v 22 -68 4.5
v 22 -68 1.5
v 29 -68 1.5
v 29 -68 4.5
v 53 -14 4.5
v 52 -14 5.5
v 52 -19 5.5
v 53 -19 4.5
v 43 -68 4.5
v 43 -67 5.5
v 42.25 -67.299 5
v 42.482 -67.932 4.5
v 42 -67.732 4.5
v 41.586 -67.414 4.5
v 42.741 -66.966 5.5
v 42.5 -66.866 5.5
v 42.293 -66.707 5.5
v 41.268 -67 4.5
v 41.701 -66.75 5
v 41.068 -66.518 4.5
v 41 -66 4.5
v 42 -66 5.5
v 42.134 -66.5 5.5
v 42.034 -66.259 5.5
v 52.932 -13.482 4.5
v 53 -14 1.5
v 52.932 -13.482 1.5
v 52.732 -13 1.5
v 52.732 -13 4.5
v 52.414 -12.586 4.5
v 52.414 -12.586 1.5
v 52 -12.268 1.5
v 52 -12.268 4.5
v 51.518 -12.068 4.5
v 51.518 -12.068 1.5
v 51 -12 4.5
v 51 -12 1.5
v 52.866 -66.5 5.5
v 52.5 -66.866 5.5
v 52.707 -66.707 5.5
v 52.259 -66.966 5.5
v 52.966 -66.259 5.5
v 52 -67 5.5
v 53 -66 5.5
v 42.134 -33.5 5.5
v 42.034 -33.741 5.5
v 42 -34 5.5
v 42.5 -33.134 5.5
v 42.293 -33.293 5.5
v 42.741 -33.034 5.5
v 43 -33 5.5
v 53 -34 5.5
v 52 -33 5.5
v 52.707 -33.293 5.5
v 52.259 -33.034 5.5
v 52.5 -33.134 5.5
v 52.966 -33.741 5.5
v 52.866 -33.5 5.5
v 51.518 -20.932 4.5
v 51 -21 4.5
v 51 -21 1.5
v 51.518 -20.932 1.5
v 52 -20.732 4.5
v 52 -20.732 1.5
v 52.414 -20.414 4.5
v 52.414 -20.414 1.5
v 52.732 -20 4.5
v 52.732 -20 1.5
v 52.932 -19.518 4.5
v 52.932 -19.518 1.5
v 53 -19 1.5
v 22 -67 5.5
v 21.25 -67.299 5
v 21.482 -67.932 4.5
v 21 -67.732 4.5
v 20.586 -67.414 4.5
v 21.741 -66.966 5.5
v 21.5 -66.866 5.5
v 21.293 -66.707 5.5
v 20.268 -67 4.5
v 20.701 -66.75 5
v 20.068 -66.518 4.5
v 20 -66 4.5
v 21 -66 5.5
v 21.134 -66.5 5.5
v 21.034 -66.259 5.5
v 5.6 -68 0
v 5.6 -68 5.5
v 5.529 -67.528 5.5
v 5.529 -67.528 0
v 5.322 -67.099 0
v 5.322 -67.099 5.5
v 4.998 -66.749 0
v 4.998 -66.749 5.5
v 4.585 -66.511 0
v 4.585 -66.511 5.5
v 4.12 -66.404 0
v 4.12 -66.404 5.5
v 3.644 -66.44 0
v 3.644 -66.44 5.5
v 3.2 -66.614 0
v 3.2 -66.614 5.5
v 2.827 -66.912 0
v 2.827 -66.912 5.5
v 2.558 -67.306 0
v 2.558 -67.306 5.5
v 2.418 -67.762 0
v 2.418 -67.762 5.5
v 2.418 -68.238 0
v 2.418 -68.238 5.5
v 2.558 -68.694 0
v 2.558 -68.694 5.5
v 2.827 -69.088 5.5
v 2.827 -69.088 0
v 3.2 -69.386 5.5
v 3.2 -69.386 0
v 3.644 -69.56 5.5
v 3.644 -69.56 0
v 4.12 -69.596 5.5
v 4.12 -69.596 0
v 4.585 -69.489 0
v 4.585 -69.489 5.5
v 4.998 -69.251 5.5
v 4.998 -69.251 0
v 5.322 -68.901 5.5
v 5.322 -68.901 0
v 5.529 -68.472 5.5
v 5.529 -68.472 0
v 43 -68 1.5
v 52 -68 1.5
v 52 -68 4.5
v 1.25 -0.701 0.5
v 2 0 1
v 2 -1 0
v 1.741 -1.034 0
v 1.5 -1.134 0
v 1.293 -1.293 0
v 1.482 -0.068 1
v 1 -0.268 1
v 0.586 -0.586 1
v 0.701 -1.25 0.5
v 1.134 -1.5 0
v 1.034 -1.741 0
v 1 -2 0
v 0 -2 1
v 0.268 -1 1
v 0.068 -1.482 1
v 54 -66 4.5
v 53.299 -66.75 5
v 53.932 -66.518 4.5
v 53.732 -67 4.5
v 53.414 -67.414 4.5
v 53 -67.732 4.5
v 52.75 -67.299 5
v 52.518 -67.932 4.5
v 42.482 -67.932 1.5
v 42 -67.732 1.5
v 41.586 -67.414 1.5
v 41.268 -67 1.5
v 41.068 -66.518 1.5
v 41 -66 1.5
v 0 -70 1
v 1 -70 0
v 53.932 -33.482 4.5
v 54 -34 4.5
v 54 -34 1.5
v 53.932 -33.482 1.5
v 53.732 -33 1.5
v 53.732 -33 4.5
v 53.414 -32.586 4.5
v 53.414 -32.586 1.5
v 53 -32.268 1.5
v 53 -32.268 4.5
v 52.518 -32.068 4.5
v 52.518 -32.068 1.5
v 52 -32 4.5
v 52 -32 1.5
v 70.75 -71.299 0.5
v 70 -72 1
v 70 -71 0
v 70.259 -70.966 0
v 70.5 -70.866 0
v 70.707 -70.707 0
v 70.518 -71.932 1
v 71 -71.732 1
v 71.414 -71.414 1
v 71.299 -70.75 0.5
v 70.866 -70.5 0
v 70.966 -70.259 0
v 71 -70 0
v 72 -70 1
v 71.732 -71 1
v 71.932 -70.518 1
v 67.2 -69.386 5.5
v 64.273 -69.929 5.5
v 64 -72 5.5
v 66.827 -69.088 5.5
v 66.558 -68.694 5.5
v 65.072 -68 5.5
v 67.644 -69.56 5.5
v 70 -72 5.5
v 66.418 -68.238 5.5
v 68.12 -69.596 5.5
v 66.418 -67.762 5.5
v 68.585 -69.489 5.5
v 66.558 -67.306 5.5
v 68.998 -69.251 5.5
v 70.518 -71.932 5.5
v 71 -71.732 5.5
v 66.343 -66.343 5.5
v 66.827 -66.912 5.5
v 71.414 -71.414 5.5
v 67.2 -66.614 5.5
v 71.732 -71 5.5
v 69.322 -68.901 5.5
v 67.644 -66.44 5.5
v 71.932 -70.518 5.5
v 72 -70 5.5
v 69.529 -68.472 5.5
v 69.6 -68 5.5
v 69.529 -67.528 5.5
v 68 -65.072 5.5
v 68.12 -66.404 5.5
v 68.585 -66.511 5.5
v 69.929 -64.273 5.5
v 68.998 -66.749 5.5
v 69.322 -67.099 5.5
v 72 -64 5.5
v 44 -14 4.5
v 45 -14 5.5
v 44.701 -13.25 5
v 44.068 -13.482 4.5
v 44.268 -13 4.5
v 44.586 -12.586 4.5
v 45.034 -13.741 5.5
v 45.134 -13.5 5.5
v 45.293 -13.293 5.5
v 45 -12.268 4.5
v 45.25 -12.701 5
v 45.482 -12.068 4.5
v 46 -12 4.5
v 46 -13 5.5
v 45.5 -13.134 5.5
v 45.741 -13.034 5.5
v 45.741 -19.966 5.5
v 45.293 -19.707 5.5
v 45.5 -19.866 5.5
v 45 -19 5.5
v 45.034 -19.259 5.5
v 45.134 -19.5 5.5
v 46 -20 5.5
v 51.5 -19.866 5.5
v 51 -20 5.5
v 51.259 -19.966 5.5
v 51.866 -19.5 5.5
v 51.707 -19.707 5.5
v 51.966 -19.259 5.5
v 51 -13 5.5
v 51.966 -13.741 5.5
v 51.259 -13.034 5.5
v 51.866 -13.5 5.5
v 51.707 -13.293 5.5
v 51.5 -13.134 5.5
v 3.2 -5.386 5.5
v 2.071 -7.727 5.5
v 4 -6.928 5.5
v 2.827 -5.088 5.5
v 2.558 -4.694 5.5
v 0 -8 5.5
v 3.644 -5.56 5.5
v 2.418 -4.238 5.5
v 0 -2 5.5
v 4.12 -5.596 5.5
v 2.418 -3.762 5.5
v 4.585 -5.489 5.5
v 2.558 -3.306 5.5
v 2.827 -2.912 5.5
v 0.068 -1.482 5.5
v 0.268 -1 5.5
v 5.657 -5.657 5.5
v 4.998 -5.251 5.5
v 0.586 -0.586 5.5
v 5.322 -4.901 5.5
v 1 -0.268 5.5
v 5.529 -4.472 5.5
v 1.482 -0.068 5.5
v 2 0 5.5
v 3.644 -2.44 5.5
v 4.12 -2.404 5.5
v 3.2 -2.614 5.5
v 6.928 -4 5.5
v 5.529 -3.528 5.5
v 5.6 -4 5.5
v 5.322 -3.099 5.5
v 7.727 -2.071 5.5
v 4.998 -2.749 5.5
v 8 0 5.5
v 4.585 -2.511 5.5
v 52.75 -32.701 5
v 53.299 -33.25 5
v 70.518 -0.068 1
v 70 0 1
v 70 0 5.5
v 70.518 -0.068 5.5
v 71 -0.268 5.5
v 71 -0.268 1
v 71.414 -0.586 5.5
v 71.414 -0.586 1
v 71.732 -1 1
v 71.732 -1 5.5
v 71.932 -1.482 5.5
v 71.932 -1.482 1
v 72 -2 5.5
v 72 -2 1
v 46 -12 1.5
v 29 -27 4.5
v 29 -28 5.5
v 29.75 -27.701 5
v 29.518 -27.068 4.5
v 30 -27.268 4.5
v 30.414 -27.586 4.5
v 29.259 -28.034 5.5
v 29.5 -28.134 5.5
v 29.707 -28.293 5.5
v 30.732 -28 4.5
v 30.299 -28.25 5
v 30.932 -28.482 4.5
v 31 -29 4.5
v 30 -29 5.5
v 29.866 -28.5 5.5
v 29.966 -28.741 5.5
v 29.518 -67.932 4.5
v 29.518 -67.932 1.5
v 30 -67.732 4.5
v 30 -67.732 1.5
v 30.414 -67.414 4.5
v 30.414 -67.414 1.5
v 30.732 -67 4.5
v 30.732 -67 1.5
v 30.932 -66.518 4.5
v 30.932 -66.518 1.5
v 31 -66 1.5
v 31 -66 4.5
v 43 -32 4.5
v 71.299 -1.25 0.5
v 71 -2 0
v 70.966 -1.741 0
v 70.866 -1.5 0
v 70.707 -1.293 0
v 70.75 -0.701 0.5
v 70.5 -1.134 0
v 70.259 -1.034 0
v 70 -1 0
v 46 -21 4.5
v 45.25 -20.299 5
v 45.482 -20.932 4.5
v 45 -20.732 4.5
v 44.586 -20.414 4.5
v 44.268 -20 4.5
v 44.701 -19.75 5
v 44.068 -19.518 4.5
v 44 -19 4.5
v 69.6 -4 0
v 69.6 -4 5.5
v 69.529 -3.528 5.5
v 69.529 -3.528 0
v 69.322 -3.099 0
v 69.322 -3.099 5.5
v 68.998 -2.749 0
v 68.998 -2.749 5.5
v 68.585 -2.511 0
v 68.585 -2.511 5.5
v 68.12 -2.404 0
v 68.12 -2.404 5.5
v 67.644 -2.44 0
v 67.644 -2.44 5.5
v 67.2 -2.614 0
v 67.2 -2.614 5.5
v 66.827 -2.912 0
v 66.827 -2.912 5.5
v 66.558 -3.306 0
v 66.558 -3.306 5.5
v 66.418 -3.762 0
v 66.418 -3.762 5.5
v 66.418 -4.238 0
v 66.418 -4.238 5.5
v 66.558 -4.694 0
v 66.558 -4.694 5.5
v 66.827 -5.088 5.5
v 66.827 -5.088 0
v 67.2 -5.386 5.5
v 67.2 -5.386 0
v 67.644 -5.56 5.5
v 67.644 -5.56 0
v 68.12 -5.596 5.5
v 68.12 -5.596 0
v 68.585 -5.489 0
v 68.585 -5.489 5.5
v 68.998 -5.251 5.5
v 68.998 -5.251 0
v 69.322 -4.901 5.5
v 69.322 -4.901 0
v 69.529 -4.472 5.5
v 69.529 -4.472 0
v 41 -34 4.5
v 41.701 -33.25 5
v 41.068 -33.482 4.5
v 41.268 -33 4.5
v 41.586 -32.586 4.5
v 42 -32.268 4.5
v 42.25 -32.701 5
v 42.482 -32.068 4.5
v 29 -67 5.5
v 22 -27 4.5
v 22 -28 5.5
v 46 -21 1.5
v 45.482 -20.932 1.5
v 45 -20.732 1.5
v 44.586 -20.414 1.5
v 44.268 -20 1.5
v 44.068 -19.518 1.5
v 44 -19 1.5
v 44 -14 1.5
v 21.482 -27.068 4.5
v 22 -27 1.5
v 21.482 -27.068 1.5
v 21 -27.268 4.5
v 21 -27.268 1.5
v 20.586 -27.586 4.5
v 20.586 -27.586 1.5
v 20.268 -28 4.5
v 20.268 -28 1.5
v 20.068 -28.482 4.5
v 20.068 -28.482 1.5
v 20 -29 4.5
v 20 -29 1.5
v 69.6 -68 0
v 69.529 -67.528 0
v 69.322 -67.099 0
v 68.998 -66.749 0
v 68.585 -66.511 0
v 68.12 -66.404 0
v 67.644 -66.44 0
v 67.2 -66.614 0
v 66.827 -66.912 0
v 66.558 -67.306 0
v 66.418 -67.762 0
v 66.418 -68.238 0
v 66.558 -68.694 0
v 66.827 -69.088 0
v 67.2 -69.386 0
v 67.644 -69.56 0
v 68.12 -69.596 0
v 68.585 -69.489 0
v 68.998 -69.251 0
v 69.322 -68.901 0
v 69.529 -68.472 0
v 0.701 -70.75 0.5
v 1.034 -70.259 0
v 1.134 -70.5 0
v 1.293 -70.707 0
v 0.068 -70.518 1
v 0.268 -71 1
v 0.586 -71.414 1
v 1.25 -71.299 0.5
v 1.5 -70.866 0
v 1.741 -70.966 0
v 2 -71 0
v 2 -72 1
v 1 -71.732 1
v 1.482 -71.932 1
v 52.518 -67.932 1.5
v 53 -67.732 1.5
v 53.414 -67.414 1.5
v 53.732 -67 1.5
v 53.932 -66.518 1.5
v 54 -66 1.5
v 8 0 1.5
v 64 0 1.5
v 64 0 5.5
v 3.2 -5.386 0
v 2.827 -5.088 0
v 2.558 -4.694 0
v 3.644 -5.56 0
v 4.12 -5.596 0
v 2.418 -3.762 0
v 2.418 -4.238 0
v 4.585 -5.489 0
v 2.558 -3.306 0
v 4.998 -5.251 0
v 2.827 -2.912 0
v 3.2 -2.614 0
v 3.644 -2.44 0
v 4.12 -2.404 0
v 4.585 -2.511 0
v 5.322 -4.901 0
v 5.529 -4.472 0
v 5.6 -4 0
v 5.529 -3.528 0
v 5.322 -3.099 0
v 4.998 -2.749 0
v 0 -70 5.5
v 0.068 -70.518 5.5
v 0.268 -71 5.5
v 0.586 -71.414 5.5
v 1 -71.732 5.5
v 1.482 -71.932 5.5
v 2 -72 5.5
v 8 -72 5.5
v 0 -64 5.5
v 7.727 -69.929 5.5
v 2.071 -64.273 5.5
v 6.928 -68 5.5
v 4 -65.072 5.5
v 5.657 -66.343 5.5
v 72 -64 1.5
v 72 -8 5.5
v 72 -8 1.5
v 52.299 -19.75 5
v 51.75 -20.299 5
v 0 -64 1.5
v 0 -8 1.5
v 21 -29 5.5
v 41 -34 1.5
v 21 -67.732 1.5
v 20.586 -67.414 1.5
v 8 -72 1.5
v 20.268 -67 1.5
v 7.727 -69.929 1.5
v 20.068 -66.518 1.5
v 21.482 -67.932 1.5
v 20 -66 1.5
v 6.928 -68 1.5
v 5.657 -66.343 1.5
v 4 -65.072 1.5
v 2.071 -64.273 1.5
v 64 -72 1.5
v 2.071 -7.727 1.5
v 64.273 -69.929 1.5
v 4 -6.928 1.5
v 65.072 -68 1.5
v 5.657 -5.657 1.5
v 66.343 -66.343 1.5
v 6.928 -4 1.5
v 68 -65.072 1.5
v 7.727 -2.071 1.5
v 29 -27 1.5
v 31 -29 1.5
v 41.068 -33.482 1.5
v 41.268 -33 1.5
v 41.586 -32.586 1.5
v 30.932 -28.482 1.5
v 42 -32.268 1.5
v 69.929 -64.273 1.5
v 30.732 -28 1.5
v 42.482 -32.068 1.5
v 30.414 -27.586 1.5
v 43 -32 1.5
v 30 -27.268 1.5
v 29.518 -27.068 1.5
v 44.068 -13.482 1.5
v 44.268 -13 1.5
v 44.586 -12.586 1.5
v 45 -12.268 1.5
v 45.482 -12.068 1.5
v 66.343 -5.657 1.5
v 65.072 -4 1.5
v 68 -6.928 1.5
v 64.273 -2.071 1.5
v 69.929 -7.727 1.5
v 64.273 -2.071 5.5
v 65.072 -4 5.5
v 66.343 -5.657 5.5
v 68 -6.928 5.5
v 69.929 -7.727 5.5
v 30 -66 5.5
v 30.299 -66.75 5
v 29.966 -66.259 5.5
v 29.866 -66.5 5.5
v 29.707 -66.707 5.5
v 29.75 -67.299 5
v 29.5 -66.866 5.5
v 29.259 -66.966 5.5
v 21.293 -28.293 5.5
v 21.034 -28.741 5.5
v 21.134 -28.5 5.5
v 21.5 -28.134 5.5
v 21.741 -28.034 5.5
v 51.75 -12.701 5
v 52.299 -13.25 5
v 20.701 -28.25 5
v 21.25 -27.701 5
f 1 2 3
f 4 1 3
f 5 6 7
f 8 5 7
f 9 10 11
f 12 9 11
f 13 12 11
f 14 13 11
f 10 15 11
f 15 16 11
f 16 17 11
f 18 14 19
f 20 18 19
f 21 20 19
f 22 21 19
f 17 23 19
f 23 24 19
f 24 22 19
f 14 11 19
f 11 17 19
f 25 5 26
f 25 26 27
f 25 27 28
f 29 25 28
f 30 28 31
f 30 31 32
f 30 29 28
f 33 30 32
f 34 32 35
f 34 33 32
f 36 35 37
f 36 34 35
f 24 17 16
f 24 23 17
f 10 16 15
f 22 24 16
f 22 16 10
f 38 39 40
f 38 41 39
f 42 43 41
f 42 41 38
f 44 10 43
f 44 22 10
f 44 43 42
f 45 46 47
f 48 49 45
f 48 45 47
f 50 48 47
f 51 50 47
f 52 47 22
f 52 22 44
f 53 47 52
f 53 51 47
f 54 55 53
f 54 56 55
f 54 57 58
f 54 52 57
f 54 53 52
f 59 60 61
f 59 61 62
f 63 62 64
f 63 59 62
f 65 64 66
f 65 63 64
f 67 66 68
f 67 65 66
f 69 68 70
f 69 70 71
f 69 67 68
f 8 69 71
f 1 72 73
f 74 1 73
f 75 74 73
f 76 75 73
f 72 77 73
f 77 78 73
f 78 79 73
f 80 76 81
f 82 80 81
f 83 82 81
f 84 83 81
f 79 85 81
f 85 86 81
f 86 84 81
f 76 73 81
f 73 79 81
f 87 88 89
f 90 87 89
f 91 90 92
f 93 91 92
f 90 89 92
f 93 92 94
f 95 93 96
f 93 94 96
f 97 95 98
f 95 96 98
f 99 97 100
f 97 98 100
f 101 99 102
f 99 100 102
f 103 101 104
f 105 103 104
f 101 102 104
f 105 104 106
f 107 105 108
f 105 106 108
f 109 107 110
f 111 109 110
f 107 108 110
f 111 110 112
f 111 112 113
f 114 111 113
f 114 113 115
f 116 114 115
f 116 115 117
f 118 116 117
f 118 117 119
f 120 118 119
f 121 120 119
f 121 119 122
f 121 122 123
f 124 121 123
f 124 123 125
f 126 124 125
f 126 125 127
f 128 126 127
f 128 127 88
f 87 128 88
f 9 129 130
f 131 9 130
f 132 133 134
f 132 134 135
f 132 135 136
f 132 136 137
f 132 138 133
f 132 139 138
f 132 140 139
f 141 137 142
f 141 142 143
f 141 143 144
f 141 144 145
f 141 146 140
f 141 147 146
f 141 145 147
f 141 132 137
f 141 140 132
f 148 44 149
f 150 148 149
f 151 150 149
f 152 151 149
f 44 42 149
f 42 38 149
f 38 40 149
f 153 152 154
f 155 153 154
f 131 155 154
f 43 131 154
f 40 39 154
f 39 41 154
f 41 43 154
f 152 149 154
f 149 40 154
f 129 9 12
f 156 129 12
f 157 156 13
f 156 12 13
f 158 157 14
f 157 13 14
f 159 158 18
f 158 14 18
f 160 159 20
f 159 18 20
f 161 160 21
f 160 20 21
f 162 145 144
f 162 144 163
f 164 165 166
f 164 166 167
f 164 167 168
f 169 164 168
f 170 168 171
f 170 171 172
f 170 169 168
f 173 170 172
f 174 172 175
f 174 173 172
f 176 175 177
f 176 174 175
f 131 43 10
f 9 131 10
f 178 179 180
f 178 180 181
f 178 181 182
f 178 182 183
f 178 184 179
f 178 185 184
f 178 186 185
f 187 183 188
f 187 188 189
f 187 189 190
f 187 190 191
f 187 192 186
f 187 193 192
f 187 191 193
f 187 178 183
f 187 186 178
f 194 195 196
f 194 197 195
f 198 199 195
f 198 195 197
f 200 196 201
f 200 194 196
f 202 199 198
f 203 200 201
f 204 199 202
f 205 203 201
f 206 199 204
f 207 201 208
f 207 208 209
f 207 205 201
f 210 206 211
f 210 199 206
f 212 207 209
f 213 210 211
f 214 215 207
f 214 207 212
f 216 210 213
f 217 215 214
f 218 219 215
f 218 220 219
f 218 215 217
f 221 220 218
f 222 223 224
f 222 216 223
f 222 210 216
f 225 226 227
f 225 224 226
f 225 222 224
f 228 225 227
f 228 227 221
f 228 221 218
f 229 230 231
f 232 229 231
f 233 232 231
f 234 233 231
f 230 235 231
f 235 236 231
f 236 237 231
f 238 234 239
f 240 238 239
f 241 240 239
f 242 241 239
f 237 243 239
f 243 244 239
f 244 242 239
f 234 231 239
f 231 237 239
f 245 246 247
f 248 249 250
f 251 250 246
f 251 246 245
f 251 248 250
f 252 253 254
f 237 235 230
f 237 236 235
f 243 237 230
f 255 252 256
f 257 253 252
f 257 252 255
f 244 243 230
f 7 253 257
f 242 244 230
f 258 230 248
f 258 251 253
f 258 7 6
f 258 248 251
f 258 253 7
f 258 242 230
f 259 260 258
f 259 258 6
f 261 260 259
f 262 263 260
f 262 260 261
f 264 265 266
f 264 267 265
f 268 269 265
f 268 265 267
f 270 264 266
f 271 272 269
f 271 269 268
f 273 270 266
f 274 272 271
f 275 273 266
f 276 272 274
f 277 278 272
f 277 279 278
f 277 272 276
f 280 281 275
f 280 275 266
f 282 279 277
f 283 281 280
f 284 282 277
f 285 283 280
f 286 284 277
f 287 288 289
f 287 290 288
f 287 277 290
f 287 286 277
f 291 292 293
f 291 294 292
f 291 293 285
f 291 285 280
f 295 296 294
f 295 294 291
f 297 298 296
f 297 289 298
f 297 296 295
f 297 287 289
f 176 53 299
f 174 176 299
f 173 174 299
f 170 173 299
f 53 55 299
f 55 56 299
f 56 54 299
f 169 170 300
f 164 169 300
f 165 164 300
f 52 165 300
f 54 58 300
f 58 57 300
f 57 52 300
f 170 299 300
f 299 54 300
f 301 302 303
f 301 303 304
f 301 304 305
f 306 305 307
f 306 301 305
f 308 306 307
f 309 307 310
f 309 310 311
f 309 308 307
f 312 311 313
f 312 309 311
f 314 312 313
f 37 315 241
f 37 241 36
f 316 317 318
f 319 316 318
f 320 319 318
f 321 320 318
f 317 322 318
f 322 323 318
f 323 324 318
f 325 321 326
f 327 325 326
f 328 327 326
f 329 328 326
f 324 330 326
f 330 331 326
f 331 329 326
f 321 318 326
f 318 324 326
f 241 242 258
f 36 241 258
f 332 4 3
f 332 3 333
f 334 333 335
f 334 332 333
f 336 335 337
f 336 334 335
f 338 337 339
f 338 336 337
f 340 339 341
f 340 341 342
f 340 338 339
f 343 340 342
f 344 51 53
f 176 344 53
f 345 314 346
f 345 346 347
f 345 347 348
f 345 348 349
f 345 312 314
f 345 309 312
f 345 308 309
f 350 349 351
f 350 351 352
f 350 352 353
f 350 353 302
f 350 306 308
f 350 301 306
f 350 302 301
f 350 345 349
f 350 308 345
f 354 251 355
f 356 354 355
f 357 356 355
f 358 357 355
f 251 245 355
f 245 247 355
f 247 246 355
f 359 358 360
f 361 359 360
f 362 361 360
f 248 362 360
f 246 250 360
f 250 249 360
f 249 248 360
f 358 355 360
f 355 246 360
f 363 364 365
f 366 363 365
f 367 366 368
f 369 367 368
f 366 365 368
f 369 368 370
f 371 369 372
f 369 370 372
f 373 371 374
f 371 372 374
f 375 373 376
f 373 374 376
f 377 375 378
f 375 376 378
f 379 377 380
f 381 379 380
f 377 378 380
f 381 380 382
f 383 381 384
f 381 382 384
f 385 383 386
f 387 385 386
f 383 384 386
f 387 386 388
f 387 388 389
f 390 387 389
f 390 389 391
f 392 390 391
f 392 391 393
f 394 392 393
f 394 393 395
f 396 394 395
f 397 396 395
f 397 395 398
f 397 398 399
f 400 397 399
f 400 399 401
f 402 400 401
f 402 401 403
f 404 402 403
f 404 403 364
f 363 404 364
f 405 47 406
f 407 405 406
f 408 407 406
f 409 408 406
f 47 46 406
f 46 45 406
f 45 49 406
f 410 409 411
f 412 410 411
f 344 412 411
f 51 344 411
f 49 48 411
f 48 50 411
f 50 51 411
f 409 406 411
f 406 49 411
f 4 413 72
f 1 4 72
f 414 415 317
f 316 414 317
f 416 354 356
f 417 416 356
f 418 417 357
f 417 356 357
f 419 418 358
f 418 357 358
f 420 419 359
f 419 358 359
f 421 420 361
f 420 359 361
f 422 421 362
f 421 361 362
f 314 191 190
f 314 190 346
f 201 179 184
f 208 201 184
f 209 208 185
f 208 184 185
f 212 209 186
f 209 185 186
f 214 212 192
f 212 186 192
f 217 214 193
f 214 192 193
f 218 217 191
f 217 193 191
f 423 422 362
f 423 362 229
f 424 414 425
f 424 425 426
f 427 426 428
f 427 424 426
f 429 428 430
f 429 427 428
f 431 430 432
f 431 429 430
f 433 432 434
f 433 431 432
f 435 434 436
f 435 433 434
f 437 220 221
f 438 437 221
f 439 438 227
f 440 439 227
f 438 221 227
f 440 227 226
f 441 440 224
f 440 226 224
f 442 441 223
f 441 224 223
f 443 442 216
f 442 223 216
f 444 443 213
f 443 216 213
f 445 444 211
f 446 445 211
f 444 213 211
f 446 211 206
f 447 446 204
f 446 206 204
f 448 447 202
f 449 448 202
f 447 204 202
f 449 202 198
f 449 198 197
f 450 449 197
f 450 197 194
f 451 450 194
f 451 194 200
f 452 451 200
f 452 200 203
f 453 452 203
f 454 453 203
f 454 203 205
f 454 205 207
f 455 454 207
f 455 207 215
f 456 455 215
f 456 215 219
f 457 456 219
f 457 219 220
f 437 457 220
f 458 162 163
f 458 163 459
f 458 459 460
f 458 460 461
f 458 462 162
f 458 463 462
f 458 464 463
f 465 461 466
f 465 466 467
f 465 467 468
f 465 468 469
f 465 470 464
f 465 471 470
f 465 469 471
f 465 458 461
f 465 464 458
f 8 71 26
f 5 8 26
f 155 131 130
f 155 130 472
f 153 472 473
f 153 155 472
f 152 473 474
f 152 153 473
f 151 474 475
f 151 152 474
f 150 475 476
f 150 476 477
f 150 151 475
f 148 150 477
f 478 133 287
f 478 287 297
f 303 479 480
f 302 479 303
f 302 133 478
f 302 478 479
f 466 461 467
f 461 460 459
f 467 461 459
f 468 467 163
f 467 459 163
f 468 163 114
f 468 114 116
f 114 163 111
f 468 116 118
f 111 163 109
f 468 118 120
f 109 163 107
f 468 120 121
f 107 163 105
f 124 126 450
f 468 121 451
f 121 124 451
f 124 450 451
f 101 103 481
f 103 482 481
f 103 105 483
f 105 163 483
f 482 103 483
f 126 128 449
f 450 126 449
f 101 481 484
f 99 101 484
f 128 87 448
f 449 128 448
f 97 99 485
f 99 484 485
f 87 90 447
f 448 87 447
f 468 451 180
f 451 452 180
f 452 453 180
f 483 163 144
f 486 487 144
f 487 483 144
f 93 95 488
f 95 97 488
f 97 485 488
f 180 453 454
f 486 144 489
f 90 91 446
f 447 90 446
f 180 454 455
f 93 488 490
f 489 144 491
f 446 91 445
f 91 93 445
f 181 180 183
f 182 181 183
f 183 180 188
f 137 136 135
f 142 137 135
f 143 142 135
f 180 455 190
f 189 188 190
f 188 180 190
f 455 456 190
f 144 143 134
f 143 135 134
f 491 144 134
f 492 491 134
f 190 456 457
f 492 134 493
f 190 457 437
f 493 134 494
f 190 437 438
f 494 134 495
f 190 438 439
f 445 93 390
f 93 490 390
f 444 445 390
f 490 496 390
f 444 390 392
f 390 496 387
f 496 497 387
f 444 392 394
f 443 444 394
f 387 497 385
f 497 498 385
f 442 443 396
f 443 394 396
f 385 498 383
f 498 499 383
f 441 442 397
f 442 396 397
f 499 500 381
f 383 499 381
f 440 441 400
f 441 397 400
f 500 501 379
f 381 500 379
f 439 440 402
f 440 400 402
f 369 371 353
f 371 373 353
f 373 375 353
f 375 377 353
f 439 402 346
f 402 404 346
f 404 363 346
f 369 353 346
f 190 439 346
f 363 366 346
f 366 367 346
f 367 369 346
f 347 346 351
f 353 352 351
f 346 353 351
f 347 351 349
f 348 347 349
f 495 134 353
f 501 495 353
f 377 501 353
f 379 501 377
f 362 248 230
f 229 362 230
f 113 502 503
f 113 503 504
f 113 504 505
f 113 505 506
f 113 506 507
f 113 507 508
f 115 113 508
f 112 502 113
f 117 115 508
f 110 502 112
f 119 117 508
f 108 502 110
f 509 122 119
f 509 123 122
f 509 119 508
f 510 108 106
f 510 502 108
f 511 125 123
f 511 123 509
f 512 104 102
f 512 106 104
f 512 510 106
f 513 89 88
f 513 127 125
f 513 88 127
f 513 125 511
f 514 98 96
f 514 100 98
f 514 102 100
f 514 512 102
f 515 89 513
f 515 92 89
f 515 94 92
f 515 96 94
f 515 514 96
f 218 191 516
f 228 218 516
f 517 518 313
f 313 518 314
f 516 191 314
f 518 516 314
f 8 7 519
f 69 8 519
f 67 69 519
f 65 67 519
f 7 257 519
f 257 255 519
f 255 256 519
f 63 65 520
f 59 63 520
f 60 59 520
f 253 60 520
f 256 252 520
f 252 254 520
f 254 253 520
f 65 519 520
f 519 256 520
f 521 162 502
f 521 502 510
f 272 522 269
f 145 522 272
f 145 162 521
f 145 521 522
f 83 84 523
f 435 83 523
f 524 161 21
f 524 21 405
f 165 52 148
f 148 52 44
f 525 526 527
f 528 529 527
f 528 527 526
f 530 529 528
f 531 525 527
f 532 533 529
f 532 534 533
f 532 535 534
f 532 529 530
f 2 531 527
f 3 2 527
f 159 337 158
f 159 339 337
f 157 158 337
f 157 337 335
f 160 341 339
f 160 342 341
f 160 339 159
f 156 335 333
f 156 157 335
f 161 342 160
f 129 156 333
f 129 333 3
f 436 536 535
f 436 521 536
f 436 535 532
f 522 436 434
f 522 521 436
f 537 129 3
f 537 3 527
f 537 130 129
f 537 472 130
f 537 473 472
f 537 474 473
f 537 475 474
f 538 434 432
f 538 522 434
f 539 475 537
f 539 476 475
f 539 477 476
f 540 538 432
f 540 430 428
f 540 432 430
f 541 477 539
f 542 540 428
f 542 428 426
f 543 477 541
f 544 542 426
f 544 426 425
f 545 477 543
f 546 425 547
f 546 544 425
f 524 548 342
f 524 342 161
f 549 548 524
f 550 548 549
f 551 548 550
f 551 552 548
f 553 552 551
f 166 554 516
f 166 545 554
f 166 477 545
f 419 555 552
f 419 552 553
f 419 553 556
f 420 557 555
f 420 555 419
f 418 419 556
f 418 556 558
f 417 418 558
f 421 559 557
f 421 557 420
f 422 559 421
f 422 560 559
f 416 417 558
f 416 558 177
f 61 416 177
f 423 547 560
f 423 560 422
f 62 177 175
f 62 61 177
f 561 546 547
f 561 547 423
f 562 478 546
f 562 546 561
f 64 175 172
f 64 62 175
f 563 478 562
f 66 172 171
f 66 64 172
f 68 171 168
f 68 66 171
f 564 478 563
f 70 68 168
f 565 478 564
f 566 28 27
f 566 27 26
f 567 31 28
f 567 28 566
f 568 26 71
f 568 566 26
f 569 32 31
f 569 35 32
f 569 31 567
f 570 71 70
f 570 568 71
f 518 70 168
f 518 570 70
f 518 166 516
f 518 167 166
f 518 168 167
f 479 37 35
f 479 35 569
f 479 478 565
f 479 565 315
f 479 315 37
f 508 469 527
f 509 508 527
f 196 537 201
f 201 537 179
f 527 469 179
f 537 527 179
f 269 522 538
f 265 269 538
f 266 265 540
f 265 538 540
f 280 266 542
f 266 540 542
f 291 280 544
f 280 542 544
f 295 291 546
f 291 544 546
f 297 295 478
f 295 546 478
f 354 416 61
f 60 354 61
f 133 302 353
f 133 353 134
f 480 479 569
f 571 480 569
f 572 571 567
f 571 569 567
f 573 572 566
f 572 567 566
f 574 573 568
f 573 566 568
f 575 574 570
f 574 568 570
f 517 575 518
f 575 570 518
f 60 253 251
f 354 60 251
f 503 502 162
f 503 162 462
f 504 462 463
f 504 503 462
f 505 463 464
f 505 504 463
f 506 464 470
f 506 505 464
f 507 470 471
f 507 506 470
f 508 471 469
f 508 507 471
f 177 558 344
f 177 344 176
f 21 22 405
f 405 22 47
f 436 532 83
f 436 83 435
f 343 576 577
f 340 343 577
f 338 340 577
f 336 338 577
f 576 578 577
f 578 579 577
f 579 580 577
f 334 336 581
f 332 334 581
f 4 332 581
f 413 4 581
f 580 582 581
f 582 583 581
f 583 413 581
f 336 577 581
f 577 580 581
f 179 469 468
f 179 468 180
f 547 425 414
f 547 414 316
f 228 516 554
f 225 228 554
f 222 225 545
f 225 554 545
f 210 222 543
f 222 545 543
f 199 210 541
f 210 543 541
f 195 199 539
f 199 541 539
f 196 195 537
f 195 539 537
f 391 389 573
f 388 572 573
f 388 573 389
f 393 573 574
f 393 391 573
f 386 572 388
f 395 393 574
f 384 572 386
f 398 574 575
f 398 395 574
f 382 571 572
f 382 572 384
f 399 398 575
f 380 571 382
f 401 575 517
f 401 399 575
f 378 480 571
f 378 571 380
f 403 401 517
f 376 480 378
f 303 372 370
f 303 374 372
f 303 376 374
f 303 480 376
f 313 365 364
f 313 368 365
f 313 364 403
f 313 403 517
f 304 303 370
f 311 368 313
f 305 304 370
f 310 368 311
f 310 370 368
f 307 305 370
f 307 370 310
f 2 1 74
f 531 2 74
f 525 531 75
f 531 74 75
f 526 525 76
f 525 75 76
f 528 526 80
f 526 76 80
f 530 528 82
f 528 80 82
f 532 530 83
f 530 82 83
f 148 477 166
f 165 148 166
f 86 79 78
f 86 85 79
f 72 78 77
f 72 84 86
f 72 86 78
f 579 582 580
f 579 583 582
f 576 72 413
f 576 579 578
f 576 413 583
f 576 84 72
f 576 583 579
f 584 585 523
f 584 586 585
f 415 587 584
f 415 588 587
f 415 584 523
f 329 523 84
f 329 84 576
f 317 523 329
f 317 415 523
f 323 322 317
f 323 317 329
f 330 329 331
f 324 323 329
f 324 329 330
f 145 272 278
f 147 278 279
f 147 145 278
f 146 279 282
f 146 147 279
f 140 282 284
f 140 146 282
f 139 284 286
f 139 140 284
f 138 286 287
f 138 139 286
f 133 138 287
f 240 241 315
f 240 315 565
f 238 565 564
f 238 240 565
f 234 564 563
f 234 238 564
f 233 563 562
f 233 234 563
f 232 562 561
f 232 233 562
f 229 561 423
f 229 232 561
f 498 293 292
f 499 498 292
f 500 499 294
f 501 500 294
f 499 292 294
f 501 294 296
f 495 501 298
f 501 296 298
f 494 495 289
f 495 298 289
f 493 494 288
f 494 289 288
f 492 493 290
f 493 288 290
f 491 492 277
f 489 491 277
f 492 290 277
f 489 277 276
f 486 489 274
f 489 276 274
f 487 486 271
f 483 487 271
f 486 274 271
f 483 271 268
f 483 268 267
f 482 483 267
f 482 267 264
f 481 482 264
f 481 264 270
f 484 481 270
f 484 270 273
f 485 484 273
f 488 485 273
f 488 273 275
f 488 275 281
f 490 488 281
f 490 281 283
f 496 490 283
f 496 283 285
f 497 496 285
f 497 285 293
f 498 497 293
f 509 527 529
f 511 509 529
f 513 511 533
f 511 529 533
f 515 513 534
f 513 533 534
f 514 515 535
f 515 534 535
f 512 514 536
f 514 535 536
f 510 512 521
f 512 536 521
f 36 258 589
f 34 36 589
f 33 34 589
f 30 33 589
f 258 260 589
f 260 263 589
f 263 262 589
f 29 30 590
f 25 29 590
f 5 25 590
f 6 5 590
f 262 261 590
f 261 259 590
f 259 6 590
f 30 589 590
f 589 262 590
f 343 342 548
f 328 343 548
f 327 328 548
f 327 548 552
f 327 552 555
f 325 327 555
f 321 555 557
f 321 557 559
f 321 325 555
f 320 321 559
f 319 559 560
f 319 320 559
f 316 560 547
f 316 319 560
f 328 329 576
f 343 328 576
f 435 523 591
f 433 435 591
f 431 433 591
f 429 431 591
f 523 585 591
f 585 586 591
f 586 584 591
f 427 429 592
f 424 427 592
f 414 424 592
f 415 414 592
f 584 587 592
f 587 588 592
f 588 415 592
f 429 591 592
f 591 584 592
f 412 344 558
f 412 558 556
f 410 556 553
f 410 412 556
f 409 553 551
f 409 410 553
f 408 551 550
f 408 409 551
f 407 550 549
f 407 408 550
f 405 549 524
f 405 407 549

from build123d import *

# Parameters (mm, degrees)
SKETCH_W        = 72
SKETCH_H        = 72
PAD_DEPTH       = 1.5
PAD001_DEPTH    = 4
SKETCH002_R     = 1.6
POCKET_DEPTH    = 5.501
SKETCH003_W     = 11
SKETCH003_H     = 41
SKETCH003_W_2   = 13
SKETCH003_H_2   = 36
SKETCH003_W_3   = 9
SKETCH003_H_3   = 9
PAD002_DEPTH    = 4
FILLET_R        = 2
CHAMFER_SIZE    = 1
FILLET001_R     = 2
CHAMFER001_SIZE = 1


with BuildPart() as part:
    # Sketch → Pad (new body)
    with BuildSketch(Plane.XY):
        with Locations((36, -36)):
            Rectangle(SKETCH_W, SKETCH_H)
    extrude(amount=PAD_DEPTH)

    # Sketch001 (on Face6 of Pad) → Pad001 (join)
    with BuildSketch(Plane.XY.offset(1.5)):
        with BuildLine():
            ThreePointArc((0, -8), (5.656854, -5.656854), (8, 0))
            Line((0, 0), (8, 0))
            Line((0, -8), (0, 0))
        make_face()
        with BuildLine():
            ThreePointArc((8, -72), (5.656854, -66.343146), (0, -64))
            Line((0, -72), (0, -64))
            Line((8, -72), (0, -72))
        make_face()
        with BuildLine():
            ThreePointArc((72, -64), (66.343146, -66.343146), (64, -72))
            Line((64, -72), (72, -72))
            Line((72, -72), (72, -64))
        make_face()
        with BuildLine():
            ThreePointArc((64, 0), (66.343146, -5.656854), (72, -8))
            Line((72, -8), (72, 0))
            Line((72, 0), (64, 0))
        make_face()
    extrude(amount=PAD001_DEPTH)

    # Sketch002 (on Face14 of Pad001) → Pocket (cut, through all)
    with BuildSketch(Plane.XY.offset(5.5)):
        with Locations((4, -4)):
            Circle(SKETCH002_R)
        with Locations((68, -4)):
            Circle(SKETCH002_R)
        with Locations((68, -68)):
            Circle(SKETCH002_R)
        with Locations((4, -68)):
            Circle(SKETCH002_R)
    extrude(amount=-POCKET_DEPTH, mode=Mode.SUBTRACT)

    # Sketch003 (on Face6 of Pocket) → Pad002 (join)
    with BuildSketch(Plane.XY.offset(1.5)):
        with Locations((25.5, -47.5)):
            Rectangle(SKETCH003_W, SKETCH003_H)
        with Locations((47.5, -50)):
            Rectangle(SKETCH003_W_2, SKETCH003_H_2)
        with Locations((48.5, -16.5)):
            Rectangle(SKETCH003_W_3, SKETCH003_H_3)
    extrude(amount=PAD002_DEPTH)

    # Fillet
    fillet_edges = [part.edges().sort_by_distance(p)[0] for p in [
        (20, -68, 3.5),
        (31, -68, 3.5),
        (31, -27, 3.5),
        (20, -27, 3.5),
        (44, -12, 3.5),
        (53, -12, 3.5),
        (53, -21, 3.5),
        (44, -21, 3.5),
        (41, -32, 3.5),
        (54, -32, 3.5),
        (54, -68, 3.5),
        (41, -68, 3.5),
    ]]
    fillet(fillet_edges, radius=FILLET_R)

    # Chamfer
    chamfer_edges = [part.edges().sort_by_distance(p)[0] for p in [
        (20, -47.5, 5.5),
        (41, -50, 5.5),
        (44, -16.5, 5.5),
    ]]
    chamfer(chamfer_edges, length=CHAMFER_SIZE)

    # Fillet001
    fillet001_edges = [part.edges().sort_by_distance(p)[0] for p in [
        (72, -72, 3.5),
        (0, -72, 3.5),
        (0, 0, 3.5),
        (72, 0, 3.5),
    ]]
    fillet(fillet001_edges, radius=FILLET001_R)

    # Chamfer001
    chamfer001_edges = [part.edges().sort_by_distance(p)[0] for p in [
        (72, -36, 0),
    ]]
    chamfer(chamfer001_edges, length=CHAMFER001_SIZE)


solid = part.part
